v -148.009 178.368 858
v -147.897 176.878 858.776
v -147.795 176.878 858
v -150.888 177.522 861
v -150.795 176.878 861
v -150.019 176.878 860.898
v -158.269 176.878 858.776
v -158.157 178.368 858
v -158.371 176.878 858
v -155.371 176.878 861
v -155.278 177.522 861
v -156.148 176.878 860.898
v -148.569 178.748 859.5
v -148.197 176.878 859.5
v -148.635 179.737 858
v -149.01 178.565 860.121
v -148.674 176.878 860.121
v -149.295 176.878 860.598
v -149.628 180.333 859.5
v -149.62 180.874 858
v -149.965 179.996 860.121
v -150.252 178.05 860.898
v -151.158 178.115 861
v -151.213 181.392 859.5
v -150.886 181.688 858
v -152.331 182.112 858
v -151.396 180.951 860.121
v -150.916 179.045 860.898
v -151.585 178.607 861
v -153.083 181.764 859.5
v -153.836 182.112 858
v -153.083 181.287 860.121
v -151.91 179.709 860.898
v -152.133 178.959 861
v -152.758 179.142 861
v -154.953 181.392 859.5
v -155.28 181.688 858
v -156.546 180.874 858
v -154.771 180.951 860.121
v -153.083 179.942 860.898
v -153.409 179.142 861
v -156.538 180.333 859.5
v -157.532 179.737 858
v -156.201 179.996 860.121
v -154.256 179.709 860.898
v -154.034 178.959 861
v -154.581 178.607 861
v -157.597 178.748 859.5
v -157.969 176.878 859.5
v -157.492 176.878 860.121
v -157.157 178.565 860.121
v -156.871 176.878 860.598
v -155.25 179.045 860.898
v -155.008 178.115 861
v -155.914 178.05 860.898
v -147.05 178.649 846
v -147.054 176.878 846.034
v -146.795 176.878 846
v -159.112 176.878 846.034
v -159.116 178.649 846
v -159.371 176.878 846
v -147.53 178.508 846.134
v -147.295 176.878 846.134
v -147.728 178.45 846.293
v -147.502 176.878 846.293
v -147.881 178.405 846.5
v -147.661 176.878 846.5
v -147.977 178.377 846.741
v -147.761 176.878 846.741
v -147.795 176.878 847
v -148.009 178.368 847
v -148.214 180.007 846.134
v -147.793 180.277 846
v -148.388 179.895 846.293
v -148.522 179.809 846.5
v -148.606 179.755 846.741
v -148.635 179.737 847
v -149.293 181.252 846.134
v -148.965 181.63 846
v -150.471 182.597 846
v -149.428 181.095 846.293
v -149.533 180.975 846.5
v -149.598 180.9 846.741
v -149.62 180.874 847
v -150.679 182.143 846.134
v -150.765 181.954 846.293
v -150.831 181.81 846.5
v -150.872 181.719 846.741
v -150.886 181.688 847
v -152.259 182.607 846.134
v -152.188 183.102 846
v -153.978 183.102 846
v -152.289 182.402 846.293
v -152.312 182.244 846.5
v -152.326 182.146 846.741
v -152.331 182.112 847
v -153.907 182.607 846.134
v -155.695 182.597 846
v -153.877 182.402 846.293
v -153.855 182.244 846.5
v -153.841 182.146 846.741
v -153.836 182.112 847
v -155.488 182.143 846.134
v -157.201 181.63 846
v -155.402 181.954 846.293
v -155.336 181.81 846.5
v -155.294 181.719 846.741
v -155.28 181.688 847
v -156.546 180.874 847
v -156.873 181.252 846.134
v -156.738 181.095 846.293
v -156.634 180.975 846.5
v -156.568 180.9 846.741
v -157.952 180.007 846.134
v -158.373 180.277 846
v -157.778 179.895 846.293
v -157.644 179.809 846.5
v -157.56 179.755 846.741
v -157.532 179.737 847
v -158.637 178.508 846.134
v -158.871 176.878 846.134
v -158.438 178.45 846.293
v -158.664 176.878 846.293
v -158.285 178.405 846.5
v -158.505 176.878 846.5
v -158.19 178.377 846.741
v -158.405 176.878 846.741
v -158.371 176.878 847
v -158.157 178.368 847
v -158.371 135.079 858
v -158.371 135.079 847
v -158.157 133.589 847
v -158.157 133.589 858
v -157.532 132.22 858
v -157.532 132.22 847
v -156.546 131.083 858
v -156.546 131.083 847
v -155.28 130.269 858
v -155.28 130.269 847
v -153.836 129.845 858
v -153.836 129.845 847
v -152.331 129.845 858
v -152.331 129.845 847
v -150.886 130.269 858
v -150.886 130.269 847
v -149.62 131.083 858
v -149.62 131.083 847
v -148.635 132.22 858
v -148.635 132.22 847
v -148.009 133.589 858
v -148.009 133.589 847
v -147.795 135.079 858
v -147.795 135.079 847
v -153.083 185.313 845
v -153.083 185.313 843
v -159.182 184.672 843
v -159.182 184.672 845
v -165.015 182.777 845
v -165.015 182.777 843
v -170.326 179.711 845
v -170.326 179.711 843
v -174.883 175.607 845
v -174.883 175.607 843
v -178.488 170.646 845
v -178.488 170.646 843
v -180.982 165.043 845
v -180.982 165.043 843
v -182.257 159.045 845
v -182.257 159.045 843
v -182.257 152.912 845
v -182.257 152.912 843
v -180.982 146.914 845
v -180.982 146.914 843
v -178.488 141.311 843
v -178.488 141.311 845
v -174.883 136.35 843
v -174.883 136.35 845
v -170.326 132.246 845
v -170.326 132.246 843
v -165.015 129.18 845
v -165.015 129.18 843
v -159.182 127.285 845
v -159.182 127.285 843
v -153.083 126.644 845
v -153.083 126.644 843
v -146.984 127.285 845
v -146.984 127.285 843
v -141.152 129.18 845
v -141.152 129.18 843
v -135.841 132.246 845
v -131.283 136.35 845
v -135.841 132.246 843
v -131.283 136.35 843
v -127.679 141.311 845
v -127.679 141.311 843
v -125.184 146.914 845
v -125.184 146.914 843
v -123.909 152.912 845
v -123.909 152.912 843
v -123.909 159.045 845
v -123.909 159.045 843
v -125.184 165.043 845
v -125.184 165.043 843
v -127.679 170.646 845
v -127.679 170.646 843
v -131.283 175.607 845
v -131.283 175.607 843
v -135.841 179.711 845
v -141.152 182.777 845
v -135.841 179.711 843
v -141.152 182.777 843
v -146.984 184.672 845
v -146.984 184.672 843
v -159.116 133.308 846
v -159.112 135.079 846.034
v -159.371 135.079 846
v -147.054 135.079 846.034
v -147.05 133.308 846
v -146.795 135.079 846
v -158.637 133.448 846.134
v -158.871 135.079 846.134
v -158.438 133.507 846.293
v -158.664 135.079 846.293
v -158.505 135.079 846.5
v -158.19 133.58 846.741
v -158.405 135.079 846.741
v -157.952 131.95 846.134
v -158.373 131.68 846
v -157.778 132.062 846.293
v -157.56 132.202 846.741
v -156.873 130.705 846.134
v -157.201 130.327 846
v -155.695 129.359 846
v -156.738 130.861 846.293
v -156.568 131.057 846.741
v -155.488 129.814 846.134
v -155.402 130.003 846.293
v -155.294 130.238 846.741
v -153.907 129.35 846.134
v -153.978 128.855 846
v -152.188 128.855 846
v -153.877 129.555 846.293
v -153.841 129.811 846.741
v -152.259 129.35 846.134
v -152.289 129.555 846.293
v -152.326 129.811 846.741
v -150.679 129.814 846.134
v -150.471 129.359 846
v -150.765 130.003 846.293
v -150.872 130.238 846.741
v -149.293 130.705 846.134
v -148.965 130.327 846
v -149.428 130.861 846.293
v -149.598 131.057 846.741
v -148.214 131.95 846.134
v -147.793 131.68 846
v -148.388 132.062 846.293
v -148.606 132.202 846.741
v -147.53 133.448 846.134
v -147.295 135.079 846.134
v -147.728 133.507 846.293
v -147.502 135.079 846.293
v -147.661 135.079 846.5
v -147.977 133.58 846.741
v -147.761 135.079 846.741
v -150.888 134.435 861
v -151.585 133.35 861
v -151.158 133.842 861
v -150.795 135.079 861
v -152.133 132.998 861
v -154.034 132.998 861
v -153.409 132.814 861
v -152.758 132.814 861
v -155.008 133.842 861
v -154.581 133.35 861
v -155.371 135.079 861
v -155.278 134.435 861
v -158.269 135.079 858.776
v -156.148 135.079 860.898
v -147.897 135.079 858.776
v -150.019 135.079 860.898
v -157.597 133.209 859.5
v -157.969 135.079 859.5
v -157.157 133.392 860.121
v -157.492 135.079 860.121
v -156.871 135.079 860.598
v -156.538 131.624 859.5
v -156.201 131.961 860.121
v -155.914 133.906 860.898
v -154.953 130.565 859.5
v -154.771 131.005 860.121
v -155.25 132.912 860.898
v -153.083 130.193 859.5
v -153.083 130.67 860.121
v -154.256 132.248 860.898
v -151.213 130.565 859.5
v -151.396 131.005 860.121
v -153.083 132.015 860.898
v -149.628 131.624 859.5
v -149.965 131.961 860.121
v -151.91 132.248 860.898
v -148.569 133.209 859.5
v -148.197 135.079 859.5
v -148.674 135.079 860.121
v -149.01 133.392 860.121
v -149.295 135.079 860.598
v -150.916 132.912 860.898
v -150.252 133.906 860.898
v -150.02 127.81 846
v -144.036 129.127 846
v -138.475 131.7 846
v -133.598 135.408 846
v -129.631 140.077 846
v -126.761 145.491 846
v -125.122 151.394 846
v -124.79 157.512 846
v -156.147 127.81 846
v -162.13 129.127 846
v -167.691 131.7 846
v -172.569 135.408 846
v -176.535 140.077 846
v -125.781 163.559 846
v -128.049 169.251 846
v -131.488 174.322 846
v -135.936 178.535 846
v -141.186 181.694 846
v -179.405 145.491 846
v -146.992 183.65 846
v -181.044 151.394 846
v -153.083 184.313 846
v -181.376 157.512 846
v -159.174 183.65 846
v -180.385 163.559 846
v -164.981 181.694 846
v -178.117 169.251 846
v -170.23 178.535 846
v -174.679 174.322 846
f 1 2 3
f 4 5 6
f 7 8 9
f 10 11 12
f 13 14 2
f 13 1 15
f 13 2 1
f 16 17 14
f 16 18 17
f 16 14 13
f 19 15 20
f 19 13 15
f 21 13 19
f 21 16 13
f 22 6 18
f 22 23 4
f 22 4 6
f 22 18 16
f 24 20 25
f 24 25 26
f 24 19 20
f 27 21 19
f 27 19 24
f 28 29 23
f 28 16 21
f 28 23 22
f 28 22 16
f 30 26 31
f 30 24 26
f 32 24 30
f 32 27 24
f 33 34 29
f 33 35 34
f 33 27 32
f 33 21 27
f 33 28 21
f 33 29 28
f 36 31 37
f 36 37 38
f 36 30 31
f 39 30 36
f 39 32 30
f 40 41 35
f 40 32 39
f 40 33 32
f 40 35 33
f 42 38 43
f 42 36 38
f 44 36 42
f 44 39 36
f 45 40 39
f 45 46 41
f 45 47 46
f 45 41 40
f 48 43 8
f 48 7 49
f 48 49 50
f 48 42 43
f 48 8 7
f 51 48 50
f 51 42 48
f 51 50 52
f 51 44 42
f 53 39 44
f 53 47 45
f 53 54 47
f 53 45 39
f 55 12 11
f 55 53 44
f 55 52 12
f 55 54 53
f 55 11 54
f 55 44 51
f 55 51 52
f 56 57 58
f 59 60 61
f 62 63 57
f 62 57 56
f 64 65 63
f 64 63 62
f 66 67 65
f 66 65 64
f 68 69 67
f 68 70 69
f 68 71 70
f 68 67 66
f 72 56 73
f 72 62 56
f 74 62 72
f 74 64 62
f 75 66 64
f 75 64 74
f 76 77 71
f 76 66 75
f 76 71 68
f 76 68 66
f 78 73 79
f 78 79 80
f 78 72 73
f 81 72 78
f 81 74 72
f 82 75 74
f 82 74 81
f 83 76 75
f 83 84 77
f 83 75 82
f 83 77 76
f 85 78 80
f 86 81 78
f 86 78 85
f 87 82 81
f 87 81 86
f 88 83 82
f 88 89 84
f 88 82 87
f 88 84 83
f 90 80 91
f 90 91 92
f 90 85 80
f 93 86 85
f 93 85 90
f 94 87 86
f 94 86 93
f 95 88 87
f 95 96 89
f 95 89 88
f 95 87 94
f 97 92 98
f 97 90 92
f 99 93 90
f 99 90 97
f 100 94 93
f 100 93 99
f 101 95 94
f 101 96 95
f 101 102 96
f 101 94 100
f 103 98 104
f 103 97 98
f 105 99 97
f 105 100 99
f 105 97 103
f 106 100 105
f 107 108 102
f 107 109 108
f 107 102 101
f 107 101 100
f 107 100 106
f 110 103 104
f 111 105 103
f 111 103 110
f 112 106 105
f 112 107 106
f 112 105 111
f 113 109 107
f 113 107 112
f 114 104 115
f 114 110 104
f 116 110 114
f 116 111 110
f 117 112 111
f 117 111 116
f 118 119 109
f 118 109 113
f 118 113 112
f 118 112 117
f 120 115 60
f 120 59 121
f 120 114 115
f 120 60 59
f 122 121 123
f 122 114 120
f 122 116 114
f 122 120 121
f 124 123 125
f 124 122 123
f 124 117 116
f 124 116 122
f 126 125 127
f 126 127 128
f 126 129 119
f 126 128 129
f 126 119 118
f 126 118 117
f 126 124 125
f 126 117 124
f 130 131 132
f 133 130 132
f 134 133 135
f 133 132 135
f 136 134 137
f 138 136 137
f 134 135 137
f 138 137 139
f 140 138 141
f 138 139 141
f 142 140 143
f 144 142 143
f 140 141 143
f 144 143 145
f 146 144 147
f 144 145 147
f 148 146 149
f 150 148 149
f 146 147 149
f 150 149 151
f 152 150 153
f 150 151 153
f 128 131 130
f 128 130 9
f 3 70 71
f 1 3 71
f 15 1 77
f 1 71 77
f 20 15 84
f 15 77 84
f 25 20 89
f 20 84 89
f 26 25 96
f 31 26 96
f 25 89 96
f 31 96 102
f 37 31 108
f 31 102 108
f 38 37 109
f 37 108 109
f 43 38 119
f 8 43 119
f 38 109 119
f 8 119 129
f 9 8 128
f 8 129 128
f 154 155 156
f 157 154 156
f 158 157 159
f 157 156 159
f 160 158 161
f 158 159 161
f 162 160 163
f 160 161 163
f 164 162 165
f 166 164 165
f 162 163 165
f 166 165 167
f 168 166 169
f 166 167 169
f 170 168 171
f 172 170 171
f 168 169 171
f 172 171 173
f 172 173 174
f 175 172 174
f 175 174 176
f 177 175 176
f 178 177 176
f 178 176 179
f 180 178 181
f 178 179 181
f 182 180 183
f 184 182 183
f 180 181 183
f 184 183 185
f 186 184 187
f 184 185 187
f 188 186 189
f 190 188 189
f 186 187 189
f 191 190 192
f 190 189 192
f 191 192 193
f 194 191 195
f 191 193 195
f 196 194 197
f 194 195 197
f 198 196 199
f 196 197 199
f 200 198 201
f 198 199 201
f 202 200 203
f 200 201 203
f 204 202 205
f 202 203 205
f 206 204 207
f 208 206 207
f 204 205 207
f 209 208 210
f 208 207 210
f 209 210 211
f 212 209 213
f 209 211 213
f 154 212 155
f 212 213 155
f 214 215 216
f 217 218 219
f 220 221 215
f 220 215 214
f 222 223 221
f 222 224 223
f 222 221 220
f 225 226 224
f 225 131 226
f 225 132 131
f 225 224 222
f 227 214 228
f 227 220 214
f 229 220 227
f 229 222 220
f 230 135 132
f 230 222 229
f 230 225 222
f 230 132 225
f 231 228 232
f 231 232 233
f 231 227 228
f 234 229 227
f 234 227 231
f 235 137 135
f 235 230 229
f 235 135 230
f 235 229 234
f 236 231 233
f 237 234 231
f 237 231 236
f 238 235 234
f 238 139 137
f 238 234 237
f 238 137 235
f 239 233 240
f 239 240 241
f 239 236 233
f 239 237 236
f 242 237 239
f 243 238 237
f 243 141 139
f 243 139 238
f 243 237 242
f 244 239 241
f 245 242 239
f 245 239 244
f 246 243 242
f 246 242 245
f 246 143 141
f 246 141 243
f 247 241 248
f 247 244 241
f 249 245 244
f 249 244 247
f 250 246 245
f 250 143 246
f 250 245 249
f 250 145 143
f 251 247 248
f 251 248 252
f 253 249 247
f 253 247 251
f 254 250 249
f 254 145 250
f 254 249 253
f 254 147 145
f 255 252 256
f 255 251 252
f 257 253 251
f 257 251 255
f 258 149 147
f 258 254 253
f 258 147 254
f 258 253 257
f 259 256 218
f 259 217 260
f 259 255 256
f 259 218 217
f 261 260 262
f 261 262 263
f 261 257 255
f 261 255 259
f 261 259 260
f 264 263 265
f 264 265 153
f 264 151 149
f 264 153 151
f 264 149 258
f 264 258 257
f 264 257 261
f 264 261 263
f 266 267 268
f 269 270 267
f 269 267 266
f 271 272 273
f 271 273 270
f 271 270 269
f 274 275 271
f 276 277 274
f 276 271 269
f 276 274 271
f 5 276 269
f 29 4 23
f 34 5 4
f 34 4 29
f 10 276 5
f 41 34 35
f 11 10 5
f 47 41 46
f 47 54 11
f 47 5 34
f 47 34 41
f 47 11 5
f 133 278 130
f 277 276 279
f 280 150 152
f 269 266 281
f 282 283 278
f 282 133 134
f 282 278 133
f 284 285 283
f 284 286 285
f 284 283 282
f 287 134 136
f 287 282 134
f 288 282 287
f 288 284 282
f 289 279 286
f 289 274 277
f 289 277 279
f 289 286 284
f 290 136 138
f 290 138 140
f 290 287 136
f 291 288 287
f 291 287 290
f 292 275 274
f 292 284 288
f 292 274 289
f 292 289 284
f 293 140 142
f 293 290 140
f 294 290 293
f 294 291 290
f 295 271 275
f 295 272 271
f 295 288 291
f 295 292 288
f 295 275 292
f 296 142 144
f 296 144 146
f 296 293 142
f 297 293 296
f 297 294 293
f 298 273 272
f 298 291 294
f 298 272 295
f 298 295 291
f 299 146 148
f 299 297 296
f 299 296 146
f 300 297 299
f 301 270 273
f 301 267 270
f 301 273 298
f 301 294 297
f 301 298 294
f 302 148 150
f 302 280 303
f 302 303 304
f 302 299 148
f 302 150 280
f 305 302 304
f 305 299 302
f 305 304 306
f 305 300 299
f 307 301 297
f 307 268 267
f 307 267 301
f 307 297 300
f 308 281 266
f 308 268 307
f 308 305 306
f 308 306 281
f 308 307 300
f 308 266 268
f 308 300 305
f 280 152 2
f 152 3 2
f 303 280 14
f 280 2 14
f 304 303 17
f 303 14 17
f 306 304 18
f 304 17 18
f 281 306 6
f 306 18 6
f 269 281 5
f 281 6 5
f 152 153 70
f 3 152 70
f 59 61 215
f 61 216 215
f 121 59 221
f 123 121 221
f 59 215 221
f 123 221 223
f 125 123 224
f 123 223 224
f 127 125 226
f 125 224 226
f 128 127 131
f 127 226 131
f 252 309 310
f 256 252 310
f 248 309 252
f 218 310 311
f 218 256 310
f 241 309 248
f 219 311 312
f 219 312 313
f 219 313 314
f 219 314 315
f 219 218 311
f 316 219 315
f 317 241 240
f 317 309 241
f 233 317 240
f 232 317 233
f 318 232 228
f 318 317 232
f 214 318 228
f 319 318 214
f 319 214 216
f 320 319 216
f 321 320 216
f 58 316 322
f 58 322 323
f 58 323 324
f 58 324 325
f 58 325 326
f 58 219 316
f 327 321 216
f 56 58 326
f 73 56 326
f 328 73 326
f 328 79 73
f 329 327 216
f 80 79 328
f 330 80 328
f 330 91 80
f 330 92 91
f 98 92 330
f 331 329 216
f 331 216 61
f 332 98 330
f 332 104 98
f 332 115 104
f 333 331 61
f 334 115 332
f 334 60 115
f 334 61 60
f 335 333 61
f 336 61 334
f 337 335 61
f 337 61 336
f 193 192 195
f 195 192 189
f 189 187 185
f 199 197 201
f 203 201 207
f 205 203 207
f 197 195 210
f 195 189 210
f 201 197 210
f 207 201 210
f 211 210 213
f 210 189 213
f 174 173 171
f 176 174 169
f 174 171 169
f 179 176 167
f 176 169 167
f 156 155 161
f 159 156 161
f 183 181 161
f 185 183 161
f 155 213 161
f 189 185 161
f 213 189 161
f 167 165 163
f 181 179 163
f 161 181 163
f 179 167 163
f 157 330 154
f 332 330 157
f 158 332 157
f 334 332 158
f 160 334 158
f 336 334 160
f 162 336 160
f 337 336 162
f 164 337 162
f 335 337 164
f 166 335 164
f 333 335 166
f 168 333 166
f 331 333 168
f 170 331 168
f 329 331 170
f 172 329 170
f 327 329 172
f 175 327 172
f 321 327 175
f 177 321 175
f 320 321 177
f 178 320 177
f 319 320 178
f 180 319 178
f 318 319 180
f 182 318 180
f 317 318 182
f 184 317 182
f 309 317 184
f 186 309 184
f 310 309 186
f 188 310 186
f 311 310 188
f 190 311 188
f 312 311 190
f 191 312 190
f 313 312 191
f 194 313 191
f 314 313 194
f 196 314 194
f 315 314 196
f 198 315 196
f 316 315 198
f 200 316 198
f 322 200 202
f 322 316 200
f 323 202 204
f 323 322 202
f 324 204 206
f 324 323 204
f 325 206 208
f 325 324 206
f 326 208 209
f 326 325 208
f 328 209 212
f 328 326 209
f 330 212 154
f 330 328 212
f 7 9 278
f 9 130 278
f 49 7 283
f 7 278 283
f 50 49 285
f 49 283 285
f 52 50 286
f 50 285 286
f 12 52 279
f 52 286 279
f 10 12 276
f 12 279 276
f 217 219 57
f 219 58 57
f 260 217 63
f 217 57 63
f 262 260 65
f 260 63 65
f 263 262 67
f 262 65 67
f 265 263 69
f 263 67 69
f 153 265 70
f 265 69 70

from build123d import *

# Parameters (mm, degrees)
SKETCH016_R     = 29.334526
PAD012_DEPTH    = 3
PAD013_DEPTH    = 15
CHAMFER001_SIZE = 1
FILLET009_R     = 1
FILLET010_R     = 3


with BuildPart() as part:
    # Sketch016 (on DatumPlane) → Pad012 (new body)
    with BuildSketch(Plane(origin=(-153.083157, 155.978406, 843), x_dir=(0, 1, 0), z_dir=(0, 0, 1))):
        Circle(SKETCH016_R)
    extrude(amount=PAD012_DEPTH)

    # Sketch017 (on Face3 of Pad012) → Pad013 (join)
    with BuildSketch(Plane(origin=(-153.083157, 155.978406, 846), x_dir=(0, 1, 0), z_dir=(0, 0, 1))):
        with BuildLine():
            ThreePointArc((-20.899311, 5.287957), (-26.187268, 0), (-20.899311, -5.287957))
            Line((-20.899311, -5.287957), (20.899313, -5.287957))
            ThreePointArc((20.899313, -5.287957), (26.18727, 0), (20.899313, 5.287957))
            Line((-20.899311, 5.287957), (20.899313, 5.287957))
        make_face()
    extrude(amount=PAD013_DEPTH)

    # Chamfer001
    chamfer001_edges = [part.edges().sort_by_distance(p)[0] for p in [
        (-153.083157, 126.64388, 846),
    ]]
    chamfer(chamfer001_edges, length=CHAMFER001_SIZE)

    # Fillet009
    fillet009_edges = [part.edges().sort_by_distance(p)[0] for p in [
        (-147.7952, 155.978406, 846),
    ]]
    fillet(fillet009_edges, radius=FILLET009_R)

    # Fillet010
    fillet010_edges = [part.edges().sort_by_distance(p)[0] for p in [
        (-147.7952, 155.978406, 861),
    ]]
    fillet(fillet010_edges, radius=FILLET010_R)


solid = part.part
